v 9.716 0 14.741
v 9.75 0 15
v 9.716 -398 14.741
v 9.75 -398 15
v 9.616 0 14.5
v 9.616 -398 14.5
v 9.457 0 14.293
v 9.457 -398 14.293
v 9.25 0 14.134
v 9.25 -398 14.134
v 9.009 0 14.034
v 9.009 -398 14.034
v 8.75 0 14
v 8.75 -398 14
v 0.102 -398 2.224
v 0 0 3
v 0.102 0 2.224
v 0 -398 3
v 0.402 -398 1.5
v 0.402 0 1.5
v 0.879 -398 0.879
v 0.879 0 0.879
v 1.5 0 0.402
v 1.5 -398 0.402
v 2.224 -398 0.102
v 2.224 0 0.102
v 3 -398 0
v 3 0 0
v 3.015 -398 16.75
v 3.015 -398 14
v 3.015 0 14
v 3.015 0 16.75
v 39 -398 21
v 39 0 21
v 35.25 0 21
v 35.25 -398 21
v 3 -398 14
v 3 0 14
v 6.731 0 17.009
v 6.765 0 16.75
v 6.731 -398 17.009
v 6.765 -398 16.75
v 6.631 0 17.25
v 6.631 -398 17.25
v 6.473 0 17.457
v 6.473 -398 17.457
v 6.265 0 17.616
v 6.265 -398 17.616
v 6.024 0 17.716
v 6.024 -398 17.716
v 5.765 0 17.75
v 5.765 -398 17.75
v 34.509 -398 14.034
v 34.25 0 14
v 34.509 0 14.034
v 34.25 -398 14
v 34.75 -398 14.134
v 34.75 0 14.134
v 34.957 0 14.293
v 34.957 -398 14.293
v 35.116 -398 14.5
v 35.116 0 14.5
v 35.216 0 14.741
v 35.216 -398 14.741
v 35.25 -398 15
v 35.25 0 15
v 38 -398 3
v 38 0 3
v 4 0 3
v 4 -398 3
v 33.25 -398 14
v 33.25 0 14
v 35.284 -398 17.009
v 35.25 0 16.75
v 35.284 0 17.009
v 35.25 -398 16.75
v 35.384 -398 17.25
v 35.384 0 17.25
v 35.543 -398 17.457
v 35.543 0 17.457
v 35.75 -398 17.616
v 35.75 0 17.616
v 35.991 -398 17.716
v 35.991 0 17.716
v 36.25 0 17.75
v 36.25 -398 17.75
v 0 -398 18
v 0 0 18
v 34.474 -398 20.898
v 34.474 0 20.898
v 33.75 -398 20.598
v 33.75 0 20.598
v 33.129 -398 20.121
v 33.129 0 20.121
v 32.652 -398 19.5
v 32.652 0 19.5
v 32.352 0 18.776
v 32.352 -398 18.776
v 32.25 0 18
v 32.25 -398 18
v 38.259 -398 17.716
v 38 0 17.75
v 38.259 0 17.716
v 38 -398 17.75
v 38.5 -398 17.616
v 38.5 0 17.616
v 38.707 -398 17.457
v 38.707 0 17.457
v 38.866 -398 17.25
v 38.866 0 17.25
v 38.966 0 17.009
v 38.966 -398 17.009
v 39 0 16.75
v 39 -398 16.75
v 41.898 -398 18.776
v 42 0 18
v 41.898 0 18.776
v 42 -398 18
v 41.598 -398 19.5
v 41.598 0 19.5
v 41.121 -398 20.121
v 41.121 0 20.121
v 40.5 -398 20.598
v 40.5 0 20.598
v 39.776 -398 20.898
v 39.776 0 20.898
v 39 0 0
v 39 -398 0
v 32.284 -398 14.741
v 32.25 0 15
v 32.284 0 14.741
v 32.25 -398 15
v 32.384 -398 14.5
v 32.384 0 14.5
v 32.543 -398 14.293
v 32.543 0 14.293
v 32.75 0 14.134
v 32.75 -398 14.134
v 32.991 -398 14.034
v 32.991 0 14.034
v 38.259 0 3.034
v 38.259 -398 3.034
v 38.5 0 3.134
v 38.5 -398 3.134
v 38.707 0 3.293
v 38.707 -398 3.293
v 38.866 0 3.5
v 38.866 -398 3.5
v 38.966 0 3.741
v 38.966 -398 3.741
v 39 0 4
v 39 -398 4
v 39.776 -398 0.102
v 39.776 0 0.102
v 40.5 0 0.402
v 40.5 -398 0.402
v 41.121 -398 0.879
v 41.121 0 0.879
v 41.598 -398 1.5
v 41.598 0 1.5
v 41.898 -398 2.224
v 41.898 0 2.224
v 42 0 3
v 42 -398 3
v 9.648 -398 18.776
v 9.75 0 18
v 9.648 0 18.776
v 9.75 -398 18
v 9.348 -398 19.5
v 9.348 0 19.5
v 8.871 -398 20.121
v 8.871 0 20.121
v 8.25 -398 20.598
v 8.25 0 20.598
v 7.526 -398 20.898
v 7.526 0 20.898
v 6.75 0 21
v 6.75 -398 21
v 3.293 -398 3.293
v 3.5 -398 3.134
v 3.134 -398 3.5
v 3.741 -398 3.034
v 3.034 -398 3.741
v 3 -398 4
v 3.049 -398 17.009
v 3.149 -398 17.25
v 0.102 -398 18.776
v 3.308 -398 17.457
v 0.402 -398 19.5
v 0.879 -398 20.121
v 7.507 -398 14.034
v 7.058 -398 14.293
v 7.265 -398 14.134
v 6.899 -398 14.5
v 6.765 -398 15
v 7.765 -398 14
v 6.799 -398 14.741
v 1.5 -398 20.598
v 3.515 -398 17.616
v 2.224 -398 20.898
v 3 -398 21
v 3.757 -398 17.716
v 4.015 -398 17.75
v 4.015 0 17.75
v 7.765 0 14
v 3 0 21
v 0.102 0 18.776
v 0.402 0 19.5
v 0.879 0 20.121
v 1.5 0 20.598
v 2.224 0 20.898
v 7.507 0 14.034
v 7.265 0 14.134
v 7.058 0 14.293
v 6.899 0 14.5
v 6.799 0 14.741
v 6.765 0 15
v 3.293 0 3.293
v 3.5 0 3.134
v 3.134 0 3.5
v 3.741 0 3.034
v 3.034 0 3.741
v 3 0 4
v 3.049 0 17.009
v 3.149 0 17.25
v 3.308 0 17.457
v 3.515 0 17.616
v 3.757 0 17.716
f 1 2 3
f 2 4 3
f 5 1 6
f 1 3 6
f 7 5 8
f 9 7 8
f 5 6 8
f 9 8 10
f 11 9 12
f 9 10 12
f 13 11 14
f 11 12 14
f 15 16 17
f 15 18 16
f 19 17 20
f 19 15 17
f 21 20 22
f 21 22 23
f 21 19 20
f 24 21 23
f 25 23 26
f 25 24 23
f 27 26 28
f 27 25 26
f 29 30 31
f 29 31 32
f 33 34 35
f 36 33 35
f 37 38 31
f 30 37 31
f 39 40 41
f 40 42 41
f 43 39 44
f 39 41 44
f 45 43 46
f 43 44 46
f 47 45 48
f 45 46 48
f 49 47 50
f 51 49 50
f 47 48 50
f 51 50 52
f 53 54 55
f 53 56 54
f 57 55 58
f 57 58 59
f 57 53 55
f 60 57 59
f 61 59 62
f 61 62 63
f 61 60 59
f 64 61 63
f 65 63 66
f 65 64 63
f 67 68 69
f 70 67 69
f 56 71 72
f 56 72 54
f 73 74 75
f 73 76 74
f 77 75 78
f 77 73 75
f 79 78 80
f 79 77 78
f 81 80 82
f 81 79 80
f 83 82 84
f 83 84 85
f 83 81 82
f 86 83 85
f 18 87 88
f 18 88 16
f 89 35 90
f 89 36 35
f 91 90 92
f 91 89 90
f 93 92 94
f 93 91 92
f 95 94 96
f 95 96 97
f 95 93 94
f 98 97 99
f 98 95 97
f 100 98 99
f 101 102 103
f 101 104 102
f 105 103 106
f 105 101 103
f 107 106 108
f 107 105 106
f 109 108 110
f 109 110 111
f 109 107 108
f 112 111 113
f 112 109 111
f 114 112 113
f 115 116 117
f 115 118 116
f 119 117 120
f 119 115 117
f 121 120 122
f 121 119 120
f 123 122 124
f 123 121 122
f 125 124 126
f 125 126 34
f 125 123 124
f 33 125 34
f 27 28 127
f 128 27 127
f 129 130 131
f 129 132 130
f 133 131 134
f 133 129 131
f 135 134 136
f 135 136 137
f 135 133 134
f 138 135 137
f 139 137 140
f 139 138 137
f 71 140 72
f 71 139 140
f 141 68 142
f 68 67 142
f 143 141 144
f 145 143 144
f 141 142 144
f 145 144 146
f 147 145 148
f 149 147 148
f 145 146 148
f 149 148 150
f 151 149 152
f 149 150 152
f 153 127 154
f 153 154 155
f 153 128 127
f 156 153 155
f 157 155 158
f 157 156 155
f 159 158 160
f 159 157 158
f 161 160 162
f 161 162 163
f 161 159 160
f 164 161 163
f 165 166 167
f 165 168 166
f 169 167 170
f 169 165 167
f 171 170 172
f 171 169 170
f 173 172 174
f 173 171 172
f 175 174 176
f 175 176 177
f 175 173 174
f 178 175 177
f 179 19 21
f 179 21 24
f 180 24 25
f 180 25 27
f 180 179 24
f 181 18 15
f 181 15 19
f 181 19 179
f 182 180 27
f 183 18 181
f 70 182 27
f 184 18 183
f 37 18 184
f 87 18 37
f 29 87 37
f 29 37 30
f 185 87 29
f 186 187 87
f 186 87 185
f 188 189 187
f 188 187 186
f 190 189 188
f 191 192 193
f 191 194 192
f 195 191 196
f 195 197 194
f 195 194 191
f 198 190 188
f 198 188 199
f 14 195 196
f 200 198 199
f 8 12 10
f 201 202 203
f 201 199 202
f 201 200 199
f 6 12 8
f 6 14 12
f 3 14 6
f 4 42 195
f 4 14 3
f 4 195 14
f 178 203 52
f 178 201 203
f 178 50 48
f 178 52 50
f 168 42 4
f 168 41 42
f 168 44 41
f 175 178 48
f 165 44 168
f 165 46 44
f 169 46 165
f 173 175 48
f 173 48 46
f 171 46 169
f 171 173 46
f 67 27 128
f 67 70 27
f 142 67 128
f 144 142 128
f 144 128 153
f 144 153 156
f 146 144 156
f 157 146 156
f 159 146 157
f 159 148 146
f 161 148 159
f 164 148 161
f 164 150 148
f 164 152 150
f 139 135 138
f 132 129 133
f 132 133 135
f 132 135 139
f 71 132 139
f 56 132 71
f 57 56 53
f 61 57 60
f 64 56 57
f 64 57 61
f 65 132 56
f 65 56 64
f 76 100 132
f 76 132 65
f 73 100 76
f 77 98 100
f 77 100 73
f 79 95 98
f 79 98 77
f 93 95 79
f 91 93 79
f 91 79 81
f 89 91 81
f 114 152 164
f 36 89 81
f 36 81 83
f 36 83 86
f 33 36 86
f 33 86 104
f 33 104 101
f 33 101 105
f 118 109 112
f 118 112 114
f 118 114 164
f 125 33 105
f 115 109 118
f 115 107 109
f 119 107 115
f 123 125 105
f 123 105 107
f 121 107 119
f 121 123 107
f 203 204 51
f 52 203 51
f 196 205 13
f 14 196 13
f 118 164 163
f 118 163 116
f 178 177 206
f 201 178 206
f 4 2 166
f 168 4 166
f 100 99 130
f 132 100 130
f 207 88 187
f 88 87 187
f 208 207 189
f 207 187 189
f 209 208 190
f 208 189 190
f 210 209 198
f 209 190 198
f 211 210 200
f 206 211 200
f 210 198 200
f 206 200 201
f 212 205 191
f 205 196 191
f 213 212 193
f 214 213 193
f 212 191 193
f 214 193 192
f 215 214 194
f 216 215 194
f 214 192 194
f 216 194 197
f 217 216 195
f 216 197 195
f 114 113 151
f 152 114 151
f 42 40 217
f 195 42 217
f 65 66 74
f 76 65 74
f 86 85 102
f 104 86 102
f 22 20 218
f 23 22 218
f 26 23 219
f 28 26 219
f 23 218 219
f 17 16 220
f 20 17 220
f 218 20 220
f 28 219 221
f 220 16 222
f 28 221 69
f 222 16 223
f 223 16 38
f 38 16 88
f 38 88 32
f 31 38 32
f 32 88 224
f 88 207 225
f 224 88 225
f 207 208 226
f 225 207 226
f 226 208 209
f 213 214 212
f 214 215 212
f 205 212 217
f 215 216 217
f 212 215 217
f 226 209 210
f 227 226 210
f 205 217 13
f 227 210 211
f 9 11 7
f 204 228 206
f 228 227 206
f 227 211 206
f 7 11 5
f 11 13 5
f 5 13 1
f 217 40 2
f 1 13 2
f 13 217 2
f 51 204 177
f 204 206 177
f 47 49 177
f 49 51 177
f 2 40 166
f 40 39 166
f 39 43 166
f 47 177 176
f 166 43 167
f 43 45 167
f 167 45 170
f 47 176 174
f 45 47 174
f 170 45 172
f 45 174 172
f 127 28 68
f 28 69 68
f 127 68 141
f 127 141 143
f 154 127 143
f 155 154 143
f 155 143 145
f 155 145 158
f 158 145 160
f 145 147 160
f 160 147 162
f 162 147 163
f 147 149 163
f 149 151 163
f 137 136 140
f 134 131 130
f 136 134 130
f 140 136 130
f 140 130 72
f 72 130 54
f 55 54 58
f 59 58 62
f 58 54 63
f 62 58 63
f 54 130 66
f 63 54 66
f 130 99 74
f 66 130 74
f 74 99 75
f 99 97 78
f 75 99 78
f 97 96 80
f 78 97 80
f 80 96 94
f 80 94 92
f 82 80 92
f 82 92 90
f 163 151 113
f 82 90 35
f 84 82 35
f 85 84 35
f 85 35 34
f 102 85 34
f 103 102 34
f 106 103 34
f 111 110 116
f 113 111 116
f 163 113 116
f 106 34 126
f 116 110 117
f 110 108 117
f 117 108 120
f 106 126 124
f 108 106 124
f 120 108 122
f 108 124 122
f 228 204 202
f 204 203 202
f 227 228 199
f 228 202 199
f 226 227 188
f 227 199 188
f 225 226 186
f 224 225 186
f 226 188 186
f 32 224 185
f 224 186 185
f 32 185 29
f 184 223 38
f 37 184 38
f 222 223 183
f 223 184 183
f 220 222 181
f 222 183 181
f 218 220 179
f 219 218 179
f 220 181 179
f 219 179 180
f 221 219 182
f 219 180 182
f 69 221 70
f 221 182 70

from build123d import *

# Parameters (mm, degrees)
F1_DEPTH = 398
F2_R     = 3
F3_R     = 1


with BuildPart() as f1:
    # F0 (on Front) → F1 (new body)
    with BuildSketch(Plane.XZ):
        Polygon((0, 21), (0, 0), (42, 0), (42, 21), (32.25, 21), (32.25, 14), (35.25, 14), (35.25, 17.75), (39, 17.75), (39, 14), (39, 3), (3, 3), (3, 14), (3.015397, 14), (3.015397, 17.75), (6.765397, 17.75), (6.765397, 14), (9.75, 14), (9.75, 21), align=None)
    extrude(amount=F1_DEPTH)

    # F2
    f2_edges = [f1.edges().sort_by_distance(p)[0] for p in [
        (0, -199, 21),
        (9.75, -199, 21),
        (32.25, -199, 21),
        (42, -199, 21),
        (0, -199, 0),
        (42, -199, 0),
    ]]
    fillet(f2_edges, radius=F2_R)

    # F3
    f3_edges = [f1.edges().sort_by_distance(p)[0] for p in [
        (6.765397, -199, 14),
        (32.25, -199, 14),
        (35.25, -199, 14),
        (9.75, -199, 14),
        (3, -199, 3),
        (39, -199, 3),
        (39, -199, 17.75),
        (3.015397, -199, 17.75),
        (35.25, -199, 17.75),
        (6.765397, -199, 17.75),
    ]]
    fillet(f3_edges, radius=F3_R)


solid = f1.part
